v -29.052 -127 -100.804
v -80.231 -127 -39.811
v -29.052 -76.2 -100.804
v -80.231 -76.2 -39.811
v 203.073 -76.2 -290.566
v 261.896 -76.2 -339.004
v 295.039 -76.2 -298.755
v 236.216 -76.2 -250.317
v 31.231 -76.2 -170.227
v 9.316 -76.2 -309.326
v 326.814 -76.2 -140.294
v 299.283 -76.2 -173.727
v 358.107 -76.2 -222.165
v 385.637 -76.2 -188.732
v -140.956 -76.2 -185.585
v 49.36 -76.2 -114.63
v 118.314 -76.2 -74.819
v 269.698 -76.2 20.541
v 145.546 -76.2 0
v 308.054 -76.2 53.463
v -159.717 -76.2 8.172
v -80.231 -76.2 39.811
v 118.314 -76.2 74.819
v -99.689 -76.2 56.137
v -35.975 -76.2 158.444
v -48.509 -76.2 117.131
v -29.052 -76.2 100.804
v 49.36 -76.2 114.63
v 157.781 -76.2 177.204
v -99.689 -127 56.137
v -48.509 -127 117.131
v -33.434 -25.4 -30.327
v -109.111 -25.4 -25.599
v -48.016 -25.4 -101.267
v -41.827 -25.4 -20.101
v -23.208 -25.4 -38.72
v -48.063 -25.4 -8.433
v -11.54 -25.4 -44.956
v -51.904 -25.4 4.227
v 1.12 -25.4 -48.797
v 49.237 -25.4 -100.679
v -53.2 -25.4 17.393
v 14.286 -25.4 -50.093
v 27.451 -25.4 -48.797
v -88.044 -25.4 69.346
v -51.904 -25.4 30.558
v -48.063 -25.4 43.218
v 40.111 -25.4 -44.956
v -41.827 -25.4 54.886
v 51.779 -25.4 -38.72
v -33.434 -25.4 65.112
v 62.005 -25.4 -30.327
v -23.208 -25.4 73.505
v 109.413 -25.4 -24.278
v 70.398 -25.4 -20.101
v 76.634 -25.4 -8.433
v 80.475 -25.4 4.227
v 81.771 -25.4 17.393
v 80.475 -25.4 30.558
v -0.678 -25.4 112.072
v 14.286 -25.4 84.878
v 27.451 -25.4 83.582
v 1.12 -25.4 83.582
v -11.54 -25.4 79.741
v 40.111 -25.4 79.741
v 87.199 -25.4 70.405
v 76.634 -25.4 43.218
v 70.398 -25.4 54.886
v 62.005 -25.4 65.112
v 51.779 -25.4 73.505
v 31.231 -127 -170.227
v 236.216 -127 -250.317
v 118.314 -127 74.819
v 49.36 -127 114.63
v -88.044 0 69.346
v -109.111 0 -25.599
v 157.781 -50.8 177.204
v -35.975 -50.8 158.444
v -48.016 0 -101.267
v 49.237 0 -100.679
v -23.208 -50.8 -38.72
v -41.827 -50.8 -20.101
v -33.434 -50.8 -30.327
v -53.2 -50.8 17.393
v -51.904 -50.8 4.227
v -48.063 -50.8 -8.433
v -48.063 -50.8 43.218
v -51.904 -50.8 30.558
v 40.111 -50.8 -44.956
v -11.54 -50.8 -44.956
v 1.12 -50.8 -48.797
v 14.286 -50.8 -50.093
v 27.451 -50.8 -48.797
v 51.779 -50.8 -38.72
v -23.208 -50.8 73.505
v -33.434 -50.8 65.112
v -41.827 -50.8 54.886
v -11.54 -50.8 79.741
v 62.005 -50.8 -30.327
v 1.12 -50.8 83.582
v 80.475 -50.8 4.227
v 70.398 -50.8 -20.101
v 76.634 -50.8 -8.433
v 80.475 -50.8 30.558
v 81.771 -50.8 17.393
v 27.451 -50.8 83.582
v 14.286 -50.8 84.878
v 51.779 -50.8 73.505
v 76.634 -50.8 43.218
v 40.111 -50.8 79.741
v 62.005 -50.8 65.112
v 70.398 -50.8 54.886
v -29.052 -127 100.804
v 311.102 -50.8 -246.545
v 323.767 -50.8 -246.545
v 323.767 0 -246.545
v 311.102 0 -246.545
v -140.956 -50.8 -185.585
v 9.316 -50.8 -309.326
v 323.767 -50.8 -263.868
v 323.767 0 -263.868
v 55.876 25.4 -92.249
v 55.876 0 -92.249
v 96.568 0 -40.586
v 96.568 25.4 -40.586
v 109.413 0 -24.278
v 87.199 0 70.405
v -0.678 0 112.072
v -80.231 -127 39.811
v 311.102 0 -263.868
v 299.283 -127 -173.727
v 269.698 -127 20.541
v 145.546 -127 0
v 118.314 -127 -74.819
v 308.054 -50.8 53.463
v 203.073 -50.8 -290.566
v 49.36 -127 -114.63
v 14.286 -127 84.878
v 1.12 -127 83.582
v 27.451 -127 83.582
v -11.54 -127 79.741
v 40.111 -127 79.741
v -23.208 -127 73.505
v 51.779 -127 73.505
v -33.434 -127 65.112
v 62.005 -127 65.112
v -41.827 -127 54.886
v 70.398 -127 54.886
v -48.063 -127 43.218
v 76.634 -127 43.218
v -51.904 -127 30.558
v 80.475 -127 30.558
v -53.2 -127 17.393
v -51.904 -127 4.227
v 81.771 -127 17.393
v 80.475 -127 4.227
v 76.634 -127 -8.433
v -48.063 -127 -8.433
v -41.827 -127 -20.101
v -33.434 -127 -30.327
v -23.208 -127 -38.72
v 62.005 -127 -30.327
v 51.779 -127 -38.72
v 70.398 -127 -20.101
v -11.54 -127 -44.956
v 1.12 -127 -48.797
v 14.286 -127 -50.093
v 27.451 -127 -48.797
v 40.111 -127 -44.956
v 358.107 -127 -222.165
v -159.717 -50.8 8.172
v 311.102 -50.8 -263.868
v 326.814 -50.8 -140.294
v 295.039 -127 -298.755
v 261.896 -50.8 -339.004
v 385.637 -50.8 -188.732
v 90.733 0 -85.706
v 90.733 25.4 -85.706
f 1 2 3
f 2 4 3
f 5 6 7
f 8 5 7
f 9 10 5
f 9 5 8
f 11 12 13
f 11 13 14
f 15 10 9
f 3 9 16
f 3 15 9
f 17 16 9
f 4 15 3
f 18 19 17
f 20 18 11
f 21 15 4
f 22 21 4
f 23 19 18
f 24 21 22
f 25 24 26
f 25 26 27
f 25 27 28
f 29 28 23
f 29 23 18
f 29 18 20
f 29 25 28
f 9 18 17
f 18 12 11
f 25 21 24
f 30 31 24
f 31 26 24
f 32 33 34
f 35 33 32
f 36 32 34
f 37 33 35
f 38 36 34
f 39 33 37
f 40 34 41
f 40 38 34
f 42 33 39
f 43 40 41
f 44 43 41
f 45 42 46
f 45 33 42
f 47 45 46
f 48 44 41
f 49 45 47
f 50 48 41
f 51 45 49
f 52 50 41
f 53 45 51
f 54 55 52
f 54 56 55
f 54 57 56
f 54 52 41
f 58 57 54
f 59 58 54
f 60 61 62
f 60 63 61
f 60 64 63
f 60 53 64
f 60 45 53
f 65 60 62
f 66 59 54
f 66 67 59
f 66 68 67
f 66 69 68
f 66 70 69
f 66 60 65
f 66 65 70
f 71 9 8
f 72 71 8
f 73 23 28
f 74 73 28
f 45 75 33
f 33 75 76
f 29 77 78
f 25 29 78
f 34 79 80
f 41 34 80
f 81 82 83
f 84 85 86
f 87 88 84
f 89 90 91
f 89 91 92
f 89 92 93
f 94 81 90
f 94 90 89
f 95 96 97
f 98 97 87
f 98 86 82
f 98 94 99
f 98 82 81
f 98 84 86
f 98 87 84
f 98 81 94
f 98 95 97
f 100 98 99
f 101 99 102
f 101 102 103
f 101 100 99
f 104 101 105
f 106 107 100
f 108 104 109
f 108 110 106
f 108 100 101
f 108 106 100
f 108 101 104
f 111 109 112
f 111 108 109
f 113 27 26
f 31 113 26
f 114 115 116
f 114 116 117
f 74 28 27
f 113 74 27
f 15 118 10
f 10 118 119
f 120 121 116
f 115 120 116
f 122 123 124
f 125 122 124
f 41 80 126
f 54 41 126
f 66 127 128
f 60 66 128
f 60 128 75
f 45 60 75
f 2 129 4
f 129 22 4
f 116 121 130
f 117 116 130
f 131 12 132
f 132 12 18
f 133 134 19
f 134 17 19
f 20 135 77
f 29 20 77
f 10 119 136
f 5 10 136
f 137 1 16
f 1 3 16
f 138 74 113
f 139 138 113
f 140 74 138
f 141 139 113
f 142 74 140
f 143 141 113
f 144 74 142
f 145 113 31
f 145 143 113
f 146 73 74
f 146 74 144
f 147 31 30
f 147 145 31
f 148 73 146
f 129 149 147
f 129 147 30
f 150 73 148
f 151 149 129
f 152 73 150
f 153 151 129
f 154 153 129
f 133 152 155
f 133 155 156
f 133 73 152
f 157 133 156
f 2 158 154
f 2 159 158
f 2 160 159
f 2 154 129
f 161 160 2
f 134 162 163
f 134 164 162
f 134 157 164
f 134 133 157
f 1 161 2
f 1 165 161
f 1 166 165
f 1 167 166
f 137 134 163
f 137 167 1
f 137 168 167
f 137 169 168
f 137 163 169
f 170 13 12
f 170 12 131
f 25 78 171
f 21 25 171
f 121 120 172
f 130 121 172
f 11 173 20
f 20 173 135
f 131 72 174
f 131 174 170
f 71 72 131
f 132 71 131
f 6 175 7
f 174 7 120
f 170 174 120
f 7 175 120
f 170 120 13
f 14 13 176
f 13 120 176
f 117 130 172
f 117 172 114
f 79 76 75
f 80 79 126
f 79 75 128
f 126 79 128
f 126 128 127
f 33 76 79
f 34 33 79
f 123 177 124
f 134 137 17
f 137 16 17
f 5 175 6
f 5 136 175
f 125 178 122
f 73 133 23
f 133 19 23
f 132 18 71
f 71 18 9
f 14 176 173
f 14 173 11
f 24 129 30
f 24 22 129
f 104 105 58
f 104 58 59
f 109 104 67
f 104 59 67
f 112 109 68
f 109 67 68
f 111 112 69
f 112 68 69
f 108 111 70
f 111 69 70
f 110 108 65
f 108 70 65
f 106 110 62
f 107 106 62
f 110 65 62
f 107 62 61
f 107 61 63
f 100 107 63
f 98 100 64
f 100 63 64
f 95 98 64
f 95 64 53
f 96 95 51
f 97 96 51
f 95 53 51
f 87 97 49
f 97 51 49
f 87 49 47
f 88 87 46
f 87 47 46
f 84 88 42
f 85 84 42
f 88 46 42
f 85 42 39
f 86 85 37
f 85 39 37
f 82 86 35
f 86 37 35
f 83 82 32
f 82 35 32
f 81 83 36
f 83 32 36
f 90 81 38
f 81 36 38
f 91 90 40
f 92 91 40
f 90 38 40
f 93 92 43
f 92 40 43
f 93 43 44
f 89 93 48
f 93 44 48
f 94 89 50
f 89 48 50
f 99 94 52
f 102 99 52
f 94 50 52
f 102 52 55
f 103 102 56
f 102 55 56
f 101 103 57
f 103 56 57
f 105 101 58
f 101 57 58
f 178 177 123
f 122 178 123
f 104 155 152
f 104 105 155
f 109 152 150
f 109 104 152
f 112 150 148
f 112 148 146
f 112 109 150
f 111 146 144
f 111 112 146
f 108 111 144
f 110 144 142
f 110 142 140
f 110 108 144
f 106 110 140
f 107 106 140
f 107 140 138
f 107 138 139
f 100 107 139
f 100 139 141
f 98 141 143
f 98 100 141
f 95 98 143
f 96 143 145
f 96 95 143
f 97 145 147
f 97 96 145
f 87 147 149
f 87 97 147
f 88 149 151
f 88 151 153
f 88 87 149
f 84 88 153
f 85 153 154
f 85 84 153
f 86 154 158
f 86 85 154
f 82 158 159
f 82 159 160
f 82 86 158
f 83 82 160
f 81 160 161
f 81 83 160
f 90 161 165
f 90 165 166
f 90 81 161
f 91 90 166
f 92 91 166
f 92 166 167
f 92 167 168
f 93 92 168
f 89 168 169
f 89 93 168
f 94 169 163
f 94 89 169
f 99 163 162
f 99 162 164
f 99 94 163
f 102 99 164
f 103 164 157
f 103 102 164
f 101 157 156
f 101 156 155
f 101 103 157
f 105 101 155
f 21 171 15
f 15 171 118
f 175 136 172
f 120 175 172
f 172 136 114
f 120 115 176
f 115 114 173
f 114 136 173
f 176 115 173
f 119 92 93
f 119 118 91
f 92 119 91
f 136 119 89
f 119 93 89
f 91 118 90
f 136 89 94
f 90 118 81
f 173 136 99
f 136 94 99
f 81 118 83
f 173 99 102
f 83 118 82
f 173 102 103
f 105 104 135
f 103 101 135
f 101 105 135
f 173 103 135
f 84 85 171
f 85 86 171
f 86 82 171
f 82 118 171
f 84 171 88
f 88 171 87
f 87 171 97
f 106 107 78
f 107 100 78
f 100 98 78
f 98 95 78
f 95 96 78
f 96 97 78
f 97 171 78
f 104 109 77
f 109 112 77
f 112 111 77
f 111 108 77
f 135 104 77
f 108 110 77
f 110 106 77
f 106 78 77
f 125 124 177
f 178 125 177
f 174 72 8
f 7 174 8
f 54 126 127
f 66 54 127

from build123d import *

# Parameters (mm, degrees)
F0_W      = 42.0805886388
F0_H      = 55.5550716817
F1_DEPTH  = 25.4
F2_R      = 67.4858140494
F3_DEPTH  = 25.4
F5_DEPTH  = 25.4
F6_R      = 67.4858140494
F7_DEPTH  = 25.4
F9_DEPTH  = 25.4
F10_R     = 67.4858140494
F11_DEPTH = 25.4
F12_DEPTH = 25.4
F13_DEPTH = 25.4
F14_DEPTH = 25.4
F15_DEPTH = 25.4
F16_DEPTH = 25.4
F17_W     = 12.6644528484
F17_H     = 17.322853056
F18_DEPTH = 25.4
F19_DEPTH = 25.4
F20_DEPTH = 25.4
F22_DEPTH = 25.4


with BuildPart() as f1:
    # F0 (on Front) → F1 (new body)
    with BuildSketch(Plane.XZ):
        with Locations((21.0402943194, 27.7775358409)):
            Rectangle(F0_W, F0_H)
    extrude(amount=F1_DEPTH)

    # F2 (on face) → F3 (join)
    with BuildSketch(Plane.XZ.offset(25.4)):
        with Locations((14.285591431, 17.3925496638)):
            Circle(F2_R)
    extrude(amount=F3_DEPTH)

    # F4 (on Front) → F5 (join)
    with BuildSketch(Plane.XZ):
        Polygon((-109.1110140085, -25.598902516), (-48.0155766011, -101.2670804933), (49.2365693262, -100.6790813872), (109.4125743078, -24.2776805175), (87.1986792259, 70.4053089563), (-0.677599842, 112.0716647794), (-88.0436324084, 69.3457711783), align=None)
    extrude(amount=F5_DEPTH)


with BuildPart() as f7:
    # F6 (on face) → F7 (new body)
    with BuildSketch(Plane.XZ.offset(50.8)):
        Polygon((157.7814564986, 177.2044847987), (-35.9753862901, 158.4442306974), (-159.7166608355, 8.1719503684), (-140.9564067342, -185.5848924203), (9.3158735947, -309.3261669657), (203.0727163835, -290.5659128645), (326.8139909289, -140.2936325355), (308.0537368276, 53.4632102532), align=None)
        with Locations((14.285591431, 17.3925496638)):
            Circle(F6_R, mode=Mode.SUBTRACT)
    extrude(amount=F7_DEPTH)

    # F8 (on face) → F9 (join)
    with BuildSketch(Plane.XZ.offset(76.2)):
        Polygon((31.2306833812, -170.2270698134), (236.2159565481, -250.3165272384), (299.2832751437, -173.7271287987), (269.6982669285, 20.541463453), align=None)
    extrude(amount=F9_DEPTH)

    # F10 (on face) → F11 (join)
    with BuildSketch(Plane.XZ.offset(76.2)):
        Polygon((-80.231256783, 39.8105914543), (-80.231256783, -39.8105914543), (-29.0517469407, -100.8039561761), (49.3598112917, -114.6300294918), (118.31377837, -74.8194380375), (145.5458267602, 0), (118.31377837, 74.8194380375), (49.3598112917, 114.6300294918), (-29.0517469407, 100.8039561761), align=None)
        with Locations((14.285591431, 17.3925496638)):
            Circle(F10_R, mode=Mode.SUBTRACT)
    extrude(amount=F11_DEPTH)

    # F12 (add): a face of the model
    f12_faces = [f7.faces().sort_by_distance(p)[0] for p in [
        (-54.6415018619, -88.9, 70.3072738152),
    ]]
    extrude(f12_faces, amount=F12_DEPTH)

    # F13 (add): faces of the model
    f13_faces = [f7.faces().sort_by_distance(p)[0] for p in [
        (-76.8570445884, -101.6, 0),
        (196.8860649719, -101.6, -133.5669586083),
    ]]
    extrude(f13_faces, amount=F13_DEPTH)

    # F14 (add): a face of the model
    f14_faces = [f7.faces().sort_by_distance(p)[0] for p in [
        (266.359924228, -82.7324648006, -213.7094793633),
    ]]
    extrude(f14_faces, amount=F14_DEPTH)

    # F15 (add): a face of the model
    f15_faces = [f7.faces().sort_by_distance(p)[0] for p in [
        (285.967744121, -82.7324648006, -229.8554819349),
    ]]
    extrude(f15_faces, amount=F15_DEPTH)

    # F16 (add): a face of the model
    f16_faces = [f7.faces().sort_by_distance(p)[0] for p in [
        (305.5755640141, -82.7324648006, -246.0014845064),
    ]]
    extrude(f16_faces, amount=F16_DEPTH)

    # F17 (on face) → F18 (join)
    with BuildSketch(Plane(origin=(0, -50.8, 0), x_dir=(-1, 0, 0), z_dir=(0, 1, 0))):
        with Locations((-317.4345869112, -255.2063538866)):
            Rectangle(F17_W, F17_H)
    extrude(amount=F18_DEPTH)

    # F19 (add): a face of the model
    f19_faces = [f7.faces().sort_by_distance(p)[0] for p in [
        (317.4345869112, -25.4, -255.2063538866),
    ]]
    extrude(f19_faces, amount=F19_DEPTH)

    # F20 (add): a face of the model
    f20_faces = [f7.faces().sort_by_distance(p)[0] for p in [
        (317.4345869112, 0, -255.2063538866),
    ]]
    extrude(f20_faces, amount=-F20_DEPTH)


with BuildPart() as f22:
    # F21 (on face) → F22 (new body)
    with BuildSketch(Plane(origin=(0, 0, 0), x_dir=(-1, 0, 0), z_dir=(0, 1, 0))):
        Polygon((-55.8760432432, -92.2493907081), (-96.5675093433, -40.586190161), (-90.7332182541, -85.7058153757), align=None)
    extrude(amount=F22_DEPTH)


solid = Compound([f1.part, f7.part, f22.part])
